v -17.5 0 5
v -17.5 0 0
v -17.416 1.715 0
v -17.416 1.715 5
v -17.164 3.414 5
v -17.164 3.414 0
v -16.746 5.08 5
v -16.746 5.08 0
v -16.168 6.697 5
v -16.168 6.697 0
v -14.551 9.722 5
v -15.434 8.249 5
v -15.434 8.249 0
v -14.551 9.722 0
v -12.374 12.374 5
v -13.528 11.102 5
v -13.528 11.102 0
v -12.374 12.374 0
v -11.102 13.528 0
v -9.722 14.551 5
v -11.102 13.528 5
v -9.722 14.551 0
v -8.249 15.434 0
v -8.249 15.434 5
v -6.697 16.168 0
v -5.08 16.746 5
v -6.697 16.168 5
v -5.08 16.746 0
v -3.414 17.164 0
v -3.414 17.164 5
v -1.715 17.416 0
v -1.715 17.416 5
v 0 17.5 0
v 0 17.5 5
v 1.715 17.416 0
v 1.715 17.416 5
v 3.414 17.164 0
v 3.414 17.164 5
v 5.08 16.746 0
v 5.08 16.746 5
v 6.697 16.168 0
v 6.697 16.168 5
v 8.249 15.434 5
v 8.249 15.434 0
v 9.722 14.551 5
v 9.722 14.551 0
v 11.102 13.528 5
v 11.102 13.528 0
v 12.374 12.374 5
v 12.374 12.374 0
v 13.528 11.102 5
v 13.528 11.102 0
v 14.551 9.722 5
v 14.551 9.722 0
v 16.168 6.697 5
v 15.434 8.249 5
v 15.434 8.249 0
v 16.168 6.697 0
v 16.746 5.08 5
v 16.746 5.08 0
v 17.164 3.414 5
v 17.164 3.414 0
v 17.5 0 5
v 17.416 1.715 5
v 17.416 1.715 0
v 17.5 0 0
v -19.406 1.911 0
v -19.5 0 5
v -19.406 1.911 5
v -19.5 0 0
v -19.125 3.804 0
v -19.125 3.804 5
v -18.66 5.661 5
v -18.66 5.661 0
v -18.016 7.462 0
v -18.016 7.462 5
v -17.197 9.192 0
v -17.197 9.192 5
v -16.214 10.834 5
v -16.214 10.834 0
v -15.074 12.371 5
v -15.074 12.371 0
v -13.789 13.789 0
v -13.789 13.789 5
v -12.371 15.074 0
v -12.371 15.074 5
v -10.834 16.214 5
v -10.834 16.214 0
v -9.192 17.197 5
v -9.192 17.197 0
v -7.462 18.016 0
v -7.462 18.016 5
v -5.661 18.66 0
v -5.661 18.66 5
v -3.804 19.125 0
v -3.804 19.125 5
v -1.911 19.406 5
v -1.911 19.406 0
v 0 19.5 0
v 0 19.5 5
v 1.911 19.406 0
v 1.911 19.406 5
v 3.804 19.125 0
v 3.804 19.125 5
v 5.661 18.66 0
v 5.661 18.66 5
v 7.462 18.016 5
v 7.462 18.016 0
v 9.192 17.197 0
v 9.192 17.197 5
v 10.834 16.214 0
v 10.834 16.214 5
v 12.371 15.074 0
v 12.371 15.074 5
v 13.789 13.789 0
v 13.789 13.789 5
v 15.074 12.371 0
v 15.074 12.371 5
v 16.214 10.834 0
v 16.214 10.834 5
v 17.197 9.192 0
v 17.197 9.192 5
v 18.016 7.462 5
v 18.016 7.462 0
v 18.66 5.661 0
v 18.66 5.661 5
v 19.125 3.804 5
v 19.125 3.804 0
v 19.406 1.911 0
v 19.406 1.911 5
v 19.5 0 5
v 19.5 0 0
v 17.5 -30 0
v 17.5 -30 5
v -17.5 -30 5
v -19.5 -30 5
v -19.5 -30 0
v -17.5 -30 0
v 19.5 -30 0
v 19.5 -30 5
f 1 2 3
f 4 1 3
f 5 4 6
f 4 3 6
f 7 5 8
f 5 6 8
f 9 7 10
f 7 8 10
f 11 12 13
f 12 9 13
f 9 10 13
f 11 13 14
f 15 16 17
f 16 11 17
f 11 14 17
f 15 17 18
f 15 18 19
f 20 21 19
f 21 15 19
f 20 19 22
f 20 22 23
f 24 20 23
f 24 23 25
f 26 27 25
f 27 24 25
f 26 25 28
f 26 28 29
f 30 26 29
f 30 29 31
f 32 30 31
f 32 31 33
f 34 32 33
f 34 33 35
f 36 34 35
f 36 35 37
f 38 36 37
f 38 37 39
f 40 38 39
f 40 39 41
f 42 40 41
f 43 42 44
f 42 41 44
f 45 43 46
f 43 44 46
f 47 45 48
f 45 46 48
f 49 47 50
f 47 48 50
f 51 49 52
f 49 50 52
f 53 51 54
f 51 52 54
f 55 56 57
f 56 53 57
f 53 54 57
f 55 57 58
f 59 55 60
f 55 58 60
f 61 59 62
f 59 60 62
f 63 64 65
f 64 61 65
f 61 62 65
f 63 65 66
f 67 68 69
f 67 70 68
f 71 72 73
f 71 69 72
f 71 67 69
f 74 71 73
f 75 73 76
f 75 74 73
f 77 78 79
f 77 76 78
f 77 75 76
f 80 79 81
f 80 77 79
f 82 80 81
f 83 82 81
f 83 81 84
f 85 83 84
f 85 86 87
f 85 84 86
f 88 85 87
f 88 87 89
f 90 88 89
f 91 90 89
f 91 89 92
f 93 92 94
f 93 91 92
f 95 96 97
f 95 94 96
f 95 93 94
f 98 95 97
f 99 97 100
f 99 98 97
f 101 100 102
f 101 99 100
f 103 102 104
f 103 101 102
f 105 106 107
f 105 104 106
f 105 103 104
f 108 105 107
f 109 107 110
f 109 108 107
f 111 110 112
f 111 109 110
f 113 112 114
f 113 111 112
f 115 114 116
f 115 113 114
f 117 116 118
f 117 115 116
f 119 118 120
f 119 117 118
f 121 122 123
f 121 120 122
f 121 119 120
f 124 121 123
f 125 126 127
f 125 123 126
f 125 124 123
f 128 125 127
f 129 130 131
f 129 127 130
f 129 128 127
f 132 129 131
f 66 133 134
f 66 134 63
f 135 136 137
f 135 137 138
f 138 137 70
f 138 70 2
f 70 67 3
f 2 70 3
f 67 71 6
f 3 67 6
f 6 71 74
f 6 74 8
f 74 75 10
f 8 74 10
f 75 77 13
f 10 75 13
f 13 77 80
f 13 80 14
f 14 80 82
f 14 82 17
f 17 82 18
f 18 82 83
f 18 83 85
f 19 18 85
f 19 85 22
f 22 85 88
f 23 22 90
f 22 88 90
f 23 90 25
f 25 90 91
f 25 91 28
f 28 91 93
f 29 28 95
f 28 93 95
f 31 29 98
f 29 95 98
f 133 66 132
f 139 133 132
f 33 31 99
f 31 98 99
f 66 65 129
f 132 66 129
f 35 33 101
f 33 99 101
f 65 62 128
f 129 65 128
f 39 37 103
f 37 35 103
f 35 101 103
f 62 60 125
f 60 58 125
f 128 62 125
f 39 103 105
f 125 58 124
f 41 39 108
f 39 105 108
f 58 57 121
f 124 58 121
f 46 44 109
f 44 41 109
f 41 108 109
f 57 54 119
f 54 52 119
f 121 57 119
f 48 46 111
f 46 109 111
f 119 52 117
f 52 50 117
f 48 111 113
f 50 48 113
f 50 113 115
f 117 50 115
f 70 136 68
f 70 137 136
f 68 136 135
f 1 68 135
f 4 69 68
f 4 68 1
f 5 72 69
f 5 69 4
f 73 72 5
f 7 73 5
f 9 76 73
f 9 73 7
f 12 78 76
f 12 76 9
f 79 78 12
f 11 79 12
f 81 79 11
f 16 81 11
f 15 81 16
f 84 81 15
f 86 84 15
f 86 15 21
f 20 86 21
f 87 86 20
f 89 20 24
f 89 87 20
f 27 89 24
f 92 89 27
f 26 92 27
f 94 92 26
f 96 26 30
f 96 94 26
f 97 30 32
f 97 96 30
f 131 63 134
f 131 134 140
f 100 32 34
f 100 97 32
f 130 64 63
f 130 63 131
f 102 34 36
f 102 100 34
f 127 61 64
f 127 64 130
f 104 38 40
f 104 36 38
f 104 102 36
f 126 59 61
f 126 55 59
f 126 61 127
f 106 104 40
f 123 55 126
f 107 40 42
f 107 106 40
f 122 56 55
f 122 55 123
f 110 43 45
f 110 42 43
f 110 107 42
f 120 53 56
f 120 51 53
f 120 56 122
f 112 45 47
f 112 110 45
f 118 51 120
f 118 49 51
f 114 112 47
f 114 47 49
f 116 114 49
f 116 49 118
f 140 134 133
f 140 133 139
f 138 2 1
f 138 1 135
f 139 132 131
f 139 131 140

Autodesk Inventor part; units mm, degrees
ref_plane "YZ Plane" through (0, 0, 0) normal (1, 0, 0) x (0, 1, 0)
ref_plane "XZ Plane" through (0, 0, 0) normal (0, 1, 0) x (-1, 0, 0)
ref_plane "XY Plane" through (0, 0, 0) normal (0, 0, 1) x (1, 0, 0)
sketch "Sketch1" plane through (0, 0, 0) normal (0, 0, 1) x (1, 0, 0)
  arc A0 (17.5, 0) -> (-17.5, 0) centre (0, 0) ccw
  arc A1 (19.5, 0) -> (-19.5, 0) centre (0, 0) ccw
  line L0 (-19.5, 0) -> (-17.5, 0)
  line L1 (-17.5, 0) -> (-17.5, -10)
  line L2 (-17.5, -10) -> (-19.5, -10)
  line L3 (-19.5, -10) -> (-19.5, 0)
  line L4 (17.5, 0) -> (19.5, 0)
  line L5 (19.5, 0) -> (19.5, -10)
  line L6 (19.5, -10) -> (17.5, -10)
  line L7 (17.5, -10) -> (17.5, 0)
  dimension "d0" = 17.5
  dimension "d1" = 19.5
  dimension "d2" = 10
  dimension "d3" = 10
  dimension "d4" = 2
  dimension "d5" = 2
  dimension "d6" = 19.5
  dimension "d7" = 19.5
extrude "Extrusion1" add sketch "Sketch1" along normal blind 5
sketch "Sketch2" plane through (17.5, -10, 0) normal (0, -1, 0) x (1, 0, 0)
  line L0 (-35, 0) -> (-35, 5) projected
  line L1 (-37, 5) -> (-35, 5)
  line L2 (-35, 5) -> (-35, 0)
  line L3 (-35, 0) -> (-37, 0)
  line L4 (-37, 0) -> (-37, 5)
  line L5 (2, 0) -> (0, 0)
  line L6 (0, 0) -> (0, 5)
  line L7 (0, 5) -> (2, 5)
  line L8 (2, 5) -> (2, 0)
  point P0 (-17.5, 0)
  dimension "d10" = 2
  dimension "d11" = 5
  dimension "d12" = 2
  dimension "d13" = 5
extrude "Extrusion2" add sketch "Sketch2" along normal blind 20
properties part number "Team29_TubeHolder"
